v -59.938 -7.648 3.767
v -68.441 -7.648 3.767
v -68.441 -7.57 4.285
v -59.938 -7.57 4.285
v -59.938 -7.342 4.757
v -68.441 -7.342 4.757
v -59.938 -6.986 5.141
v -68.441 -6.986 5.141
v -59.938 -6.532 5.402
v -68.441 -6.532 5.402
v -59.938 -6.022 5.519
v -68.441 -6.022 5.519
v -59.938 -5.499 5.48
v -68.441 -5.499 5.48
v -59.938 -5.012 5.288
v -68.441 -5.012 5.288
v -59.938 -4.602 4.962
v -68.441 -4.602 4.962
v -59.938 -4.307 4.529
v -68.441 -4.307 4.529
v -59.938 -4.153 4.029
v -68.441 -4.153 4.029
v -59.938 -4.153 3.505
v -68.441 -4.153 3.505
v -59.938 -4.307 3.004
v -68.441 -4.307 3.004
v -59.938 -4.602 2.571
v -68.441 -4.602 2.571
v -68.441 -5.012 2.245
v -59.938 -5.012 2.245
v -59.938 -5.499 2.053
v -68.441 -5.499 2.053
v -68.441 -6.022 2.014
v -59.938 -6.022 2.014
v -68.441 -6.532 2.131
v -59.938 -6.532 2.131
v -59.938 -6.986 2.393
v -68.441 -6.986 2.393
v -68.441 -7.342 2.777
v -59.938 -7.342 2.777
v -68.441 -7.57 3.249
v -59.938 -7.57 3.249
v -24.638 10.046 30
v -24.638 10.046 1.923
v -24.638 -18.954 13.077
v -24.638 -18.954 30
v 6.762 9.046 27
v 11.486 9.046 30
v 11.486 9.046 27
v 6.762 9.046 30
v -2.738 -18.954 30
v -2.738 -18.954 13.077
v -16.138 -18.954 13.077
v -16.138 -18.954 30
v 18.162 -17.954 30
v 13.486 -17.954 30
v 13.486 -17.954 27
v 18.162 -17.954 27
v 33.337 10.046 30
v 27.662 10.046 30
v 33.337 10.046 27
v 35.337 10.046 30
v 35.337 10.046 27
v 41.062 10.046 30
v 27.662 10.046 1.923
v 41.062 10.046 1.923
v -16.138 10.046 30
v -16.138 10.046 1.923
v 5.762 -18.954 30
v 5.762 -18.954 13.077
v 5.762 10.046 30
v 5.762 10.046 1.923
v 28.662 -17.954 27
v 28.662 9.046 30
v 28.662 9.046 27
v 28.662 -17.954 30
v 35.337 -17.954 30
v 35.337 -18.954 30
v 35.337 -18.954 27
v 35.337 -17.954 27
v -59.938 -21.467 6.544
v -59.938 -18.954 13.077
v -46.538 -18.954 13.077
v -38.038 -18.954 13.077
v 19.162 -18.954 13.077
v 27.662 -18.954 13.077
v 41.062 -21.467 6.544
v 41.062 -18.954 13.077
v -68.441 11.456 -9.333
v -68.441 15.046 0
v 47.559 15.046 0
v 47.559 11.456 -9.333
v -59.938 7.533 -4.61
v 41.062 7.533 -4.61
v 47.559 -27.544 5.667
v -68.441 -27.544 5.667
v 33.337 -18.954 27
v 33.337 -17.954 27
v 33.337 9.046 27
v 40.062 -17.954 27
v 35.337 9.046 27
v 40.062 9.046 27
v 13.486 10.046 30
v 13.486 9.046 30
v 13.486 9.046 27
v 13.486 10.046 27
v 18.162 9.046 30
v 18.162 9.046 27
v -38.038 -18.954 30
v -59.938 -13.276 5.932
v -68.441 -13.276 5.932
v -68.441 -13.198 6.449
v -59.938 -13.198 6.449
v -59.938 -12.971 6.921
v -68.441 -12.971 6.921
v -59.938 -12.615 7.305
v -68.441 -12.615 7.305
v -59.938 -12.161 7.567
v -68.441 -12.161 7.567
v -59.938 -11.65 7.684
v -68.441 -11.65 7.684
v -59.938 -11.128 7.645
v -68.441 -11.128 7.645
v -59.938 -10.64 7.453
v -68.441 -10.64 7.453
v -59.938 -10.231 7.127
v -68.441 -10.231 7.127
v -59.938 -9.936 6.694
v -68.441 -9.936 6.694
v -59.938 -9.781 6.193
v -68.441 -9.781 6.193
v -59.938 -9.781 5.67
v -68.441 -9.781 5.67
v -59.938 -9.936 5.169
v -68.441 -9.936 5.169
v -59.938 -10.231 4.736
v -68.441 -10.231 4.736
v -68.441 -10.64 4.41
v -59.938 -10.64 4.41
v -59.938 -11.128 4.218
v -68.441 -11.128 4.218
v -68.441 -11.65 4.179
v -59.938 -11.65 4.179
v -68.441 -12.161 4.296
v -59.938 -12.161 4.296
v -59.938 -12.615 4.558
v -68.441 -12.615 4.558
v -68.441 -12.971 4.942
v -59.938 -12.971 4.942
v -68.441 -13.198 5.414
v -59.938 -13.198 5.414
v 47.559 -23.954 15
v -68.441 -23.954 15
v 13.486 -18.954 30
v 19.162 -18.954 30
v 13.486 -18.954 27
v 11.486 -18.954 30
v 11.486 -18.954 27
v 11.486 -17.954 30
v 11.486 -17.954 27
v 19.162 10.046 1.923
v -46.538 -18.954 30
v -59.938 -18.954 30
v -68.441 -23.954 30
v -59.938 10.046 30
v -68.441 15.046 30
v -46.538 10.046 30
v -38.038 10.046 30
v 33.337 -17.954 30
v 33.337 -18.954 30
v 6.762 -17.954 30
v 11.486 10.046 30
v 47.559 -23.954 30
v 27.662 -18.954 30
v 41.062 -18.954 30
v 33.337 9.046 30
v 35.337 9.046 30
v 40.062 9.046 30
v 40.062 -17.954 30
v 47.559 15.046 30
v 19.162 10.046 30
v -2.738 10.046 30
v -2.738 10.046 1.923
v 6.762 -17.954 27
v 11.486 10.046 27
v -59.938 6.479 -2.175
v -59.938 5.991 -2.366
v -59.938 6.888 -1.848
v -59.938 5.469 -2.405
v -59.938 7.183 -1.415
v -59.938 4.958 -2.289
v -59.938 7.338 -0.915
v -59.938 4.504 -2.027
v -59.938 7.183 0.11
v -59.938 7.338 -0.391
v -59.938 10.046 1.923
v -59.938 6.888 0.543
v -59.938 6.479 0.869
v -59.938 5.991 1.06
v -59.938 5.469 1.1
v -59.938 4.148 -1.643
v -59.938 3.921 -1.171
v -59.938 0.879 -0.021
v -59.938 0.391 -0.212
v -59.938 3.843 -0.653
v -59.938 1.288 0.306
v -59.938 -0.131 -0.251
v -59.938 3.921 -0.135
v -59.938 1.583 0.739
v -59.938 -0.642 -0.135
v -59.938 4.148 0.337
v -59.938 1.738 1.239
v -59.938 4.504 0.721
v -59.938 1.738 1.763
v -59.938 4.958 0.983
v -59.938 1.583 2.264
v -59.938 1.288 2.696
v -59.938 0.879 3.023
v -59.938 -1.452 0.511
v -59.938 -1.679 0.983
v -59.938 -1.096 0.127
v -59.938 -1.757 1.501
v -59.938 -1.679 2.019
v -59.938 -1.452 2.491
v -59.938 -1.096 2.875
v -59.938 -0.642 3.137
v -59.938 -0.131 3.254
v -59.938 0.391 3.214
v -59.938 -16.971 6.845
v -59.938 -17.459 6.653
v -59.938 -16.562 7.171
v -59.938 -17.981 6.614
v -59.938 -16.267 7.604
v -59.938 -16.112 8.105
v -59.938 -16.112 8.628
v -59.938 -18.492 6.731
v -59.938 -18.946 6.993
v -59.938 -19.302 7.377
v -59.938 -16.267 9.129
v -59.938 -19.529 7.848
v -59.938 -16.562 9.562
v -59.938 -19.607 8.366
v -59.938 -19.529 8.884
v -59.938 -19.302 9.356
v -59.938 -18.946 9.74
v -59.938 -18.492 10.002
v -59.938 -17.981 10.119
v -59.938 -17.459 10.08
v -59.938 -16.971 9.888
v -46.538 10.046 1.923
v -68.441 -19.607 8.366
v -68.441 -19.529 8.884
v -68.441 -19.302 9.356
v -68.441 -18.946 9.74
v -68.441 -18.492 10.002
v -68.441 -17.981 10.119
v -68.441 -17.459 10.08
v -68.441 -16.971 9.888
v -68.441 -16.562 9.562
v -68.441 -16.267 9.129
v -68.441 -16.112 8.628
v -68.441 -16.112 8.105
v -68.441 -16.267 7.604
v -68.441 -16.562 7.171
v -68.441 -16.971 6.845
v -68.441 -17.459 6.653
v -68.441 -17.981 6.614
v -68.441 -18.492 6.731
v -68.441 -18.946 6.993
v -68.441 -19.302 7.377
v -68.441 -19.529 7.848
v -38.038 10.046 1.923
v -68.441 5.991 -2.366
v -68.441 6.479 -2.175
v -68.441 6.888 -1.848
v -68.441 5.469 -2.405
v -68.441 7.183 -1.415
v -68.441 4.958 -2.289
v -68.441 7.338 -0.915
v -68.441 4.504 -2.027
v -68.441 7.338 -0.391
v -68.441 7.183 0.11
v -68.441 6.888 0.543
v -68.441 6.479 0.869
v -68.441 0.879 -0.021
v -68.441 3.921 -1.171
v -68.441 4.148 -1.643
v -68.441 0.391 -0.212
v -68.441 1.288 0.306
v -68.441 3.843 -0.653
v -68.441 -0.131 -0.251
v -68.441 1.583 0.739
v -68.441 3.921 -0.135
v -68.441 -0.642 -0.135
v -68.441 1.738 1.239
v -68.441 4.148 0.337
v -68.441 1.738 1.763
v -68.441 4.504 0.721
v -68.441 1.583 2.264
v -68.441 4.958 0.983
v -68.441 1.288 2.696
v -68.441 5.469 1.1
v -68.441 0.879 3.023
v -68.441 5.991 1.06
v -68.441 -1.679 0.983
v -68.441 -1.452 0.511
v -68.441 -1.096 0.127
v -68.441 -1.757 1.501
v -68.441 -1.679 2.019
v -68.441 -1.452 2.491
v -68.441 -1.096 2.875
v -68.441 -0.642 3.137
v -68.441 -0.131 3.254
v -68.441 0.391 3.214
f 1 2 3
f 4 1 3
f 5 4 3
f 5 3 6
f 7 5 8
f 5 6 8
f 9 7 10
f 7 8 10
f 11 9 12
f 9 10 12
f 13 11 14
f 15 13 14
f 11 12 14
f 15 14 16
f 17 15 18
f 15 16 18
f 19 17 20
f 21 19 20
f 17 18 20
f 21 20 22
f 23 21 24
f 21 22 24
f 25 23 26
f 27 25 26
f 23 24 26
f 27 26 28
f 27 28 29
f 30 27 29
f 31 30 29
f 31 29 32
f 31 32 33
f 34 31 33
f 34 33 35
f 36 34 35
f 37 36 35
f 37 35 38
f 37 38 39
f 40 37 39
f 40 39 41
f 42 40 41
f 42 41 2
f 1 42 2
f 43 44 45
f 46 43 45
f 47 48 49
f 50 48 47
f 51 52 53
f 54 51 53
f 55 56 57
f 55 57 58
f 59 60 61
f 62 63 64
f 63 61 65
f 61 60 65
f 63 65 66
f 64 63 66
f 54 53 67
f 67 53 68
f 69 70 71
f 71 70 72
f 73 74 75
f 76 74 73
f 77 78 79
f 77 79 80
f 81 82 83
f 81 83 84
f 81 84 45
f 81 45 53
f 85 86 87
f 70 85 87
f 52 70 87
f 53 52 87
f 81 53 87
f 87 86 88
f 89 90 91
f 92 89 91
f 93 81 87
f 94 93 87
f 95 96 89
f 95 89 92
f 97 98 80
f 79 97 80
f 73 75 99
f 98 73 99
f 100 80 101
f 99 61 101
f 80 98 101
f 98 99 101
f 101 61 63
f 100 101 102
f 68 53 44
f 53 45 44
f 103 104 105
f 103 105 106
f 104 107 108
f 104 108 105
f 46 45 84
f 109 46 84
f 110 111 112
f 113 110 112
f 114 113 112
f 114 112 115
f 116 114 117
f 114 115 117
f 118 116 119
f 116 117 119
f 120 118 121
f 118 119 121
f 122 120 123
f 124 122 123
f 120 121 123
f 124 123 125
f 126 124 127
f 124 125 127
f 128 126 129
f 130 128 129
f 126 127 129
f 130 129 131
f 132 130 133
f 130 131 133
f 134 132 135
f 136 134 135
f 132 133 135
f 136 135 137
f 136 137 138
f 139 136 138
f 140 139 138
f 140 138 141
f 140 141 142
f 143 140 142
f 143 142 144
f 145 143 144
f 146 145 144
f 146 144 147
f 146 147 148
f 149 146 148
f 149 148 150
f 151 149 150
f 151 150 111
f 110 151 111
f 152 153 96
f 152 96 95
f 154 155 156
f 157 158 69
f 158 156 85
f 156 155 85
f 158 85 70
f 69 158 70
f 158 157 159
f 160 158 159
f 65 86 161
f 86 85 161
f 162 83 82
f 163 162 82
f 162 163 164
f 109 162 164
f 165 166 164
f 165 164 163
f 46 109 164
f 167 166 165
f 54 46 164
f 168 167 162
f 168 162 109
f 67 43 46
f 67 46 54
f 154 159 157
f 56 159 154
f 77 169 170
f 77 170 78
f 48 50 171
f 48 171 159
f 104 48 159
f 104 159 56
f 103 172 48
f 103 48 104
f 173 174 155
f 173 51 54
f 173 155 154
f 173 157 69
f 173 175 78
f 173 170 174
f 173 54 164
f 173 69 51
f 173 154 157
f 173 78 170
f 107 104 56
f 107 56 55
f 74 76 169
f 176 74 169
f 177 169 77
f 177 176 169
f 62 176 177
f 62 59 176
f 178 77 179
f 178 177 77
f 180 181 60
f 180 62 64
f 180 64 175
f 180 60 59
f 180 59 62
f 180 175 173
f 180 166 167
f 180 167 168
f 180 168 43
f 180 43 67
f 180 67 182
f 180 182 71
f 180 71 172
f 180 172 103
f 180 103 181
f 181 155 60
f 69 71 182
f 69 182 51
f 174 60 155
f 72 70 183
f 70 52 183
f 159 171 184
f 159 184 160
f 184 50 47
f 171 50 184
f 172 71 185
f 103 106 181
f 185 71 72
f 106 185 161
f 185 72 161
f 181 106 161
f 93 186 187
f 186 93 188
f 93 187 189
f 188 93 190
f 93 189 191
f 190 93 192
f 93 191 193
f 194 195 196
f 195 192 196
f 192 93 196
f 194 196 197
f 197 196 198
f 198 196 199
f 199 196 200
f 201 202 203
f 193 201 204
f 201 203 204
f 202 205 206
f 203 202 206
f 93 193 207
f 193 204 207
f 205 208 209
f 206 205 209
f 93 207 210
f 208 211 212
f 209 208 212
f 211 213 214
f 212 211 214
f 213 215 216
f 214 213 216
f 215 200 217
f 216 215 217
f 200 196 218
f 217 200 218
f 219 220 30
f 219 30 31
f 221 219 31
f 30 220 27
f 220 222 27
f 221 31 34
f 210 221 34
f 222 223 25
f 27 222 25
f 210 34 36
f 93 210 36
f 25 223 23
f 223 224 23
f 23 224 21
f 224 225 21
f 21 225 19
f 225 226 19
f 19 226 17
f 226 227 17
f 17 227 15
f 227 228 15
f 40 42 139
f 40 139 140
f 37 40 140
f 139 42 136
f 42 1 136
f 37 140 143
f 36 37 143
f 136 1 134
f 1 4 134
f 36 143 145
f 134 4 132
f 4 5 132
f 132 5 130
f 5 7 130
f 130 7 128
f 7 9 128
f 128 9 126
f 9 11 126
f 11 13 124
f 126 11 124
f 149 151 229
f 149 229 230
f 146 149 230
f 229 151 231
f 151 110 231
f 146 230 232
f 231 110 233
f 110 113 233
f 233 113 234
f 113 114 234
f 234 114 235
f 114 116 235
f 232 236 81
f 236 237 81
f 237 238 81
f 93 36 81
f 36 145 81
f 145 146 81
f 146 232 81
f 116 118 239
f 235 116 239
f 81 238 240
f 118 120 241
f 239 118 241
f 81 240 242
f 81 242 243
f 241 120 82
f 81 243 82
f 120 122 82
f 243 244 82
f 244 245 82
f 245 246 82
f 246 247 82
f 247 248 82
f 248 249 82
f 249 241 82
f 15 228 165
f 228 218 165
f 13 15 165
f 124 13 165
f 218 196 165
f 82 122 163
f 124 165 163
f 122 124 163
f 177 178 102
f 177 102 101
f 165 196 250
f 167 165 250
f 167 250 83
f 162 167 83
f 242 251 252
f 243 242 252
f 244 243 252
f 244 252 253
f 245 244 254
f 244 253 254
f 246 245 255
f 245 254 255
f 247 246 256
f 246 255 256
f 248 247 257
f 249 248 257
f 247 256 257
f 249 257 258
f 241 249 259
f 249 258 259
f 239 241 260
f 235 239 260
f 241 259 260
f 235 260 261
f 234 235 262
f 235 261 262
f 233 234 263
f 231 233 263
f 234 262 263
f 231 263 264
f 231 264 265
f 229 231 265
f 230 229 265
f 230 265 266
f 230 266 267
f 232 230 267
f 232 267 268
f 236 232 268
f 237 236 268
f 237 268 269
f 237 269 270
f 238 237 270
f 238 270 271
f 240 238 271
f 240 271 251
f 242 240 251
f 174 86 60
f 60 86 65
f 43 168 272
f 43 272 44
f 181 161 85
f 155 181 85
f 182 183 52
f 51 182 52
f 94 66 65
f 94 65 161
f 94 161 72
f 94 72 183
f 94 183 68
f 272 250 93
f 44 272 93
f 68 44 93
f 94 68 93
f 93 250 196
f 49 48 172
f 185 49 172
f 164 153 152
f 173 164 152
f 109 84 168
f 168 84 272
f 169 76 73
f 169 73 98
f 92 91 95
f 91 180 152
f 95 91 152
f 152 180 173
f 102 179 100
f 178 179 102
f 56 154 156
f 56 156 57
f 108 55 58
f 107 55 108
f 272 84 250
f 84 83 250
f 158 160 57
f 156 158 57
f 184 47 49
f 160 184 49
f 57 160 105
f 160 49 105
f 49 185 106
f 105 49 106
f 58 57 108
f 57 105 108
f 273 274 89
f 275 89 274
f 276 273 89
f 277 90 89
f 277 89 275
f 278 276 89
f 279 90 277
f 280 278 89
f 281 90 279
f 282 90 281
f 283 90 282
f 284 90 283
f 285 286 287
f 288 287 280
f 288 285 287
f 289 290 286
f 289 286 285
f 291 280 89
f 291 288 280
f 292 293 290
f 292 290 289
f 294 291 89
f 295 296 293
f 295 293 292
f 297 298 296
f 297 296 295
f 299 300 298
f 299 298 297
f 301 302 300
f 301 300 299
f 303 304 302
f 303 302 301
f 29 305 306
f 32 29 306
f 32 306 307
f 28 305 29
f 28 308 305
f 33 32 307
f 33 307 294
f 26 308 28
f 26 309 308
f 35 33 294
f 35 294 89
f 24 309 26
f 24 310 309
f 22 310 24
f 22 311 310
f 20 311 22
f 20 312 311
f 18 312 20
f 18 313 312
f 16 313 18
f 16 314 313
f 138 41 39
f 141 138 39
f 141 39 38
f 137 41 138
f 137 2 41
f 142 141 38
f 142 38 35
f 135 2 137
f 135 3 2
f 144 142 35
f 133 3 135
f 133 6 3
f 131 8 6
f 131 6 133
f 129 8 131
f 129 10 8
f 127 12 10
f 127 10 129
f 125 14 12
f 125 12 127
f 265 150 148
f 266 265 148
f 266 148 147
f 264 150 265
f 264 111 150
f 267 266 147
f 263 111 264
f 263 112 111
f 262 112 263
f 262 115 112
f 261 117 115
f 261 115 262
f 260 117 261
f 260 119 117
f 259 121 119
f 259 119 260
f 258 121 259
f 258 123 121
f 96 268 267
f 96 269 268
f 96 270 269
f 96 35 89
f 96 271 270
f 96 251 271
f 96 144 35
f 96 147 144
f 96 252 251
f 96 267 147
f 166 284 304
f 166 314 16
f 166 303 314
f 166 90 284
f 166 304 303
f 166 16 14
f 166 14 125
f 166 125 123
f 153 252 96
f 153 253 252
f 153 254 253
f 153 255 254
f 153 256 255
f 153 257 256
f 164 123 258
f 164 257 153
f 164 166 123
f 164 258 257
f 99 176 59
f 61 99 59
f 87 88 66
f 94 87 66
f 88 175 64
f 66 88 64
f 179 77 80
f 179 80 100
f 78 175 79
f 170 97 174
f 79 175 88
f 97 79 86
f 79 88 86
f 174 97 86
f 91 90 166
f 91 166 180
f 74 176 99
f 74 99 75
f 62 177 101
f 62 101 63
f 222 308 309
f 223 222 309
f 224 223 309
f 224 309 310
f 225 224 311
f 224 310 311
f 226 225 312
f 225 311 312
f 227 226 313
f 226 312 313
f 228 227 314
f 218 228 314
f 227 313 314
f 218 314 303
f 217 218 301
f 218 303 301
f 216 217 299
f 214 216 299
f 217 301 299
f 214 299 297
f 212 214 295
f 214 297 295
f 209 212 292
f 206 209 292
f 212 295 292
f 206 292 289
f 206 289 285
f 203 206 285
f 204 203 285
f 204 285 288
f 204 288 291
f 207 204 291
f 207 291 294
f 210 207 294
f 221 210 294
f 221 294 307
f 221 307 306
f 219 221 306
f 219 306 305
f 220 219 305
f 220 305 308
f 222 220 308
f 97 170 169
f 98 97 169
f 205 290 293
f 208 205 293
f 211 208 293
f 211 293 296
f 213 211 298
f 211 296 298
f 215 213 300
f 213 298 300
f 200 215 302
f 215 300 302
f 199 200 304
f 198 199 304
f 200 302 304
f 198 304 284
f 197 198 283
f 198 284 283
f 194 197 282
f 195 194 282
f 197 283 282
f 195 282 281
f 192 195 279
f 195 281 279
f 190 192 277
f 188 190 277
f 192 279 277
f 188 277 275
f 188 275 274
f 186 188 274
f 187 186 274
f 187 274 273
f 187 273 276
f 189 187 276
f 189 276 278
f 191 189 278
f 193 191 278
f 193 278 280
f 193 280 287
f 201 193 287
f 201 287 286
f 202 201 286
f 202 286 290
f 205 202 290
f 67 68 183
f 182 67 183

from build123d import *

# Parameters (mm, degrees)
F0_W      = 116
F0_H      = 39
F1_DEPTH  = 30
F3_DEPTH  = 121.2
F4_W      = 116
F4_H      = 41.7851648316
F5_DEPTH  = 10
F6_W      = 101
F6_H      = 31.0710200029
F7_DEPTH  = 3
F8_R      = 1.7573065985
F9_DEPTH  = 25
F10_W     = 2
F10_H     = 1
F11_DEPTH = 3


with BuildPart() as f1:
    # F0 (on Top) → F1 (new body)
    with BuildSketch(Plane.XY):
        with Locations((-10.4412920773, -4.4543696198)):
            Rectangle(F0_W, F0_H)
        Polygon((-59.9383048147, -18.9543696198), (-59.9383048147, 10.0456303802), (-46.5383048147, 10.0456303802), (-46.5383048147, -4.4543696198), (-46.5383048147, -18.9543696198), align=None, mode=Mode.SUBTRACT)
        Polygon((-38.0383048147, -18.9543696198), (-38.0383048147, -4.4543696198), (-38.0383048147, 10.0456303802), (-24.6383048147, 10.0456303802), (-24.6383048147, -4.4543696198), (-24.6383048147, -18.9543696198), align=None, mode=Mode.SUBTRACT)
        Polygon((-16.1383048147, -18.9543696198), (-16.1383048147, -4.4543696198), (-16.1383048147, 10.0456303802), (-2.7383048147, 10.0456303802), (-2.7383048147, -4.4543696198), (-2.7383048147, -18.9543696198), align=None, mode=Mode.SUBTRACT)
        Polygon((5.7616951853, -18.9543696198), (5.7616951853, -4.4543696198), (5.7616951853, 10.0456303802), (19.1616951853, 10.0456303802), (19.1616951853, -4.4543696198), (19.1616951853, -18.9543696198), align=None, mode=Mode.SUBTRACT)
        Polygon((27.6616951853, -18.9543696198), (27.6616951853, -4.4543696198), (27.6616951853, 10.0456303802), (41.0616951853, 10.0456303802), (41.0616951853, -18.9543696198), align=None, mode=Mode.SUBTRACT)
    extrude(amount=F1_DEPTH)

    # F2 (on face) → F3 (cut)
    with BuildSketch(Plane(origin=(-68.4412920773, 0, 0), x_dir=(0, -1, 0), z_dir=(-1, 0, 0))):
        Polygon((23.9543696198, 15), (-15.0456303802, 0), (23.9543696198, 0), align=None)
    extrude(amount=-F3_DEPTH, mode=Mode.SUBTRACT)

    # F4 (on face) → F5 (join)
    with BuildSketch(Plane(origin=(0, 1.9388698944, 5.0410617253), x_dir=(1, 0, 0), z_dir=(0, -0.3589790793, -0.9333456062))):
        with Locations((-10.4412920773, 6.8498094078)):
            Rectangle(F4_W, F4_H)
        Polygon((41.0616951853, 22.3853194093), (41.0616951853, -8.6857005937), (27.6616951853, -8.6857005937), (19.1616951853, -8.6857005937), (5.7616951853, -8.6857005937), (-2.7383048147, -8.6857005937), (-16.1383048147, -8.6857005937), (-24.6383048147, -8.6857005937), (-38.0383048147, -8.6857005937), (-46.5383048147, -8.6857005937), (-59.9383048147, -8.6857005937), (-59.9383048147, 22.3853194093), (-46.5383048147, 22.3853194093), (-38.0383048147, 22.3853194093), (-24.6383048147, 22.3853194093), (-16.1383048147, 22.3853194093), (-2.7383048147, 22.3853194093), (5.7616951853, 22.3853194093), (19.1616951853, 22.3853194093), (27.6616951853, 22.3853194093), align=None, mode=Mode.SUBTRACT)
    extrude(amount=F5_DEPTH)

    # F6 (on face) → F7 (join)
    with BuildSketch(Plane(origin=(0, -1.6509208987, -4.2923943367), x_dir=(1, 0, 0), z_dir=(0, -0.3589790793, -0.9333456062))):
        with Locations((-9.4383048147, 6.8498094078)):
            Rectangle(F6_W, F6_H)
    extrude(amount=-F7_DEPTH)

    # F8 (on face) → F9 (cut)
    with BuildSketch(Plane(origin=(-68.4412920773, 0, 0), x_dir=(0, -1, 0), z_dir=(-1, 0, 0))):
        with Locations((-5.6000736372, -0.6527514918)):
            Circle(F8_R)
        with Locations((0, 1.501122984)):
            Circle(F8_R)
        with Locations((5.890285937, 3.7666175752)):
            Circle(F8_R)
        with Locations((11.5189812237, 5.9315003778)):
            Circle(F8_R)
        with Locations((17.8498418632, 8.3664467776)):
            Circle(F8_R)
    extrude(amount=-F9_DEPTH, mode=Mode.SUBTRACT)

    # F10 (on face) → F11 (join)
    with BuildSketch(Plane.XY.offset(30)):
        Polygon((35.3373080328, 9.0456303802), (33.3373080328, 9.0456303802), (28.6616951853, 9.0456303802), (28.6616951853, -17.9543696198), (33.3373080328, -17.9543696198), (35.3373080328, -17.9543696198), (40.0616951853, -17.9543696198), (40.0616951853, 9.0456303802), align=None)
        Polygon((13.4860823378, 9.0456303802), (11.4860823378, 9.0456303802), (6.7616951853, 9.0456303802), (6.7616951853, -17.9543696198), (11.4860823378, -17.9543696198), (13.4860823378, -17.9543696198), (18.1616951853, -17.9543696198), (18.1616951853, 9.0456303802), align=None)
        with Locations((12.4860823378, 9.5456303802)):
            Rectangle(F10_W, F10_H)
        with Locations((34.3373080328, 9.5456303802)):
            Rectangle(F10_W, F10_H)
        with Locations((12.4860823378, -18.4543696198)):
            Rectangle(F10_W, F10_H)
        with Locations((34.3373080328, -18.4543696198)):
            Rectangle(F10_W, F10_H)
    extrude(amount=-F11_DEPTH)


solid = f1.part
